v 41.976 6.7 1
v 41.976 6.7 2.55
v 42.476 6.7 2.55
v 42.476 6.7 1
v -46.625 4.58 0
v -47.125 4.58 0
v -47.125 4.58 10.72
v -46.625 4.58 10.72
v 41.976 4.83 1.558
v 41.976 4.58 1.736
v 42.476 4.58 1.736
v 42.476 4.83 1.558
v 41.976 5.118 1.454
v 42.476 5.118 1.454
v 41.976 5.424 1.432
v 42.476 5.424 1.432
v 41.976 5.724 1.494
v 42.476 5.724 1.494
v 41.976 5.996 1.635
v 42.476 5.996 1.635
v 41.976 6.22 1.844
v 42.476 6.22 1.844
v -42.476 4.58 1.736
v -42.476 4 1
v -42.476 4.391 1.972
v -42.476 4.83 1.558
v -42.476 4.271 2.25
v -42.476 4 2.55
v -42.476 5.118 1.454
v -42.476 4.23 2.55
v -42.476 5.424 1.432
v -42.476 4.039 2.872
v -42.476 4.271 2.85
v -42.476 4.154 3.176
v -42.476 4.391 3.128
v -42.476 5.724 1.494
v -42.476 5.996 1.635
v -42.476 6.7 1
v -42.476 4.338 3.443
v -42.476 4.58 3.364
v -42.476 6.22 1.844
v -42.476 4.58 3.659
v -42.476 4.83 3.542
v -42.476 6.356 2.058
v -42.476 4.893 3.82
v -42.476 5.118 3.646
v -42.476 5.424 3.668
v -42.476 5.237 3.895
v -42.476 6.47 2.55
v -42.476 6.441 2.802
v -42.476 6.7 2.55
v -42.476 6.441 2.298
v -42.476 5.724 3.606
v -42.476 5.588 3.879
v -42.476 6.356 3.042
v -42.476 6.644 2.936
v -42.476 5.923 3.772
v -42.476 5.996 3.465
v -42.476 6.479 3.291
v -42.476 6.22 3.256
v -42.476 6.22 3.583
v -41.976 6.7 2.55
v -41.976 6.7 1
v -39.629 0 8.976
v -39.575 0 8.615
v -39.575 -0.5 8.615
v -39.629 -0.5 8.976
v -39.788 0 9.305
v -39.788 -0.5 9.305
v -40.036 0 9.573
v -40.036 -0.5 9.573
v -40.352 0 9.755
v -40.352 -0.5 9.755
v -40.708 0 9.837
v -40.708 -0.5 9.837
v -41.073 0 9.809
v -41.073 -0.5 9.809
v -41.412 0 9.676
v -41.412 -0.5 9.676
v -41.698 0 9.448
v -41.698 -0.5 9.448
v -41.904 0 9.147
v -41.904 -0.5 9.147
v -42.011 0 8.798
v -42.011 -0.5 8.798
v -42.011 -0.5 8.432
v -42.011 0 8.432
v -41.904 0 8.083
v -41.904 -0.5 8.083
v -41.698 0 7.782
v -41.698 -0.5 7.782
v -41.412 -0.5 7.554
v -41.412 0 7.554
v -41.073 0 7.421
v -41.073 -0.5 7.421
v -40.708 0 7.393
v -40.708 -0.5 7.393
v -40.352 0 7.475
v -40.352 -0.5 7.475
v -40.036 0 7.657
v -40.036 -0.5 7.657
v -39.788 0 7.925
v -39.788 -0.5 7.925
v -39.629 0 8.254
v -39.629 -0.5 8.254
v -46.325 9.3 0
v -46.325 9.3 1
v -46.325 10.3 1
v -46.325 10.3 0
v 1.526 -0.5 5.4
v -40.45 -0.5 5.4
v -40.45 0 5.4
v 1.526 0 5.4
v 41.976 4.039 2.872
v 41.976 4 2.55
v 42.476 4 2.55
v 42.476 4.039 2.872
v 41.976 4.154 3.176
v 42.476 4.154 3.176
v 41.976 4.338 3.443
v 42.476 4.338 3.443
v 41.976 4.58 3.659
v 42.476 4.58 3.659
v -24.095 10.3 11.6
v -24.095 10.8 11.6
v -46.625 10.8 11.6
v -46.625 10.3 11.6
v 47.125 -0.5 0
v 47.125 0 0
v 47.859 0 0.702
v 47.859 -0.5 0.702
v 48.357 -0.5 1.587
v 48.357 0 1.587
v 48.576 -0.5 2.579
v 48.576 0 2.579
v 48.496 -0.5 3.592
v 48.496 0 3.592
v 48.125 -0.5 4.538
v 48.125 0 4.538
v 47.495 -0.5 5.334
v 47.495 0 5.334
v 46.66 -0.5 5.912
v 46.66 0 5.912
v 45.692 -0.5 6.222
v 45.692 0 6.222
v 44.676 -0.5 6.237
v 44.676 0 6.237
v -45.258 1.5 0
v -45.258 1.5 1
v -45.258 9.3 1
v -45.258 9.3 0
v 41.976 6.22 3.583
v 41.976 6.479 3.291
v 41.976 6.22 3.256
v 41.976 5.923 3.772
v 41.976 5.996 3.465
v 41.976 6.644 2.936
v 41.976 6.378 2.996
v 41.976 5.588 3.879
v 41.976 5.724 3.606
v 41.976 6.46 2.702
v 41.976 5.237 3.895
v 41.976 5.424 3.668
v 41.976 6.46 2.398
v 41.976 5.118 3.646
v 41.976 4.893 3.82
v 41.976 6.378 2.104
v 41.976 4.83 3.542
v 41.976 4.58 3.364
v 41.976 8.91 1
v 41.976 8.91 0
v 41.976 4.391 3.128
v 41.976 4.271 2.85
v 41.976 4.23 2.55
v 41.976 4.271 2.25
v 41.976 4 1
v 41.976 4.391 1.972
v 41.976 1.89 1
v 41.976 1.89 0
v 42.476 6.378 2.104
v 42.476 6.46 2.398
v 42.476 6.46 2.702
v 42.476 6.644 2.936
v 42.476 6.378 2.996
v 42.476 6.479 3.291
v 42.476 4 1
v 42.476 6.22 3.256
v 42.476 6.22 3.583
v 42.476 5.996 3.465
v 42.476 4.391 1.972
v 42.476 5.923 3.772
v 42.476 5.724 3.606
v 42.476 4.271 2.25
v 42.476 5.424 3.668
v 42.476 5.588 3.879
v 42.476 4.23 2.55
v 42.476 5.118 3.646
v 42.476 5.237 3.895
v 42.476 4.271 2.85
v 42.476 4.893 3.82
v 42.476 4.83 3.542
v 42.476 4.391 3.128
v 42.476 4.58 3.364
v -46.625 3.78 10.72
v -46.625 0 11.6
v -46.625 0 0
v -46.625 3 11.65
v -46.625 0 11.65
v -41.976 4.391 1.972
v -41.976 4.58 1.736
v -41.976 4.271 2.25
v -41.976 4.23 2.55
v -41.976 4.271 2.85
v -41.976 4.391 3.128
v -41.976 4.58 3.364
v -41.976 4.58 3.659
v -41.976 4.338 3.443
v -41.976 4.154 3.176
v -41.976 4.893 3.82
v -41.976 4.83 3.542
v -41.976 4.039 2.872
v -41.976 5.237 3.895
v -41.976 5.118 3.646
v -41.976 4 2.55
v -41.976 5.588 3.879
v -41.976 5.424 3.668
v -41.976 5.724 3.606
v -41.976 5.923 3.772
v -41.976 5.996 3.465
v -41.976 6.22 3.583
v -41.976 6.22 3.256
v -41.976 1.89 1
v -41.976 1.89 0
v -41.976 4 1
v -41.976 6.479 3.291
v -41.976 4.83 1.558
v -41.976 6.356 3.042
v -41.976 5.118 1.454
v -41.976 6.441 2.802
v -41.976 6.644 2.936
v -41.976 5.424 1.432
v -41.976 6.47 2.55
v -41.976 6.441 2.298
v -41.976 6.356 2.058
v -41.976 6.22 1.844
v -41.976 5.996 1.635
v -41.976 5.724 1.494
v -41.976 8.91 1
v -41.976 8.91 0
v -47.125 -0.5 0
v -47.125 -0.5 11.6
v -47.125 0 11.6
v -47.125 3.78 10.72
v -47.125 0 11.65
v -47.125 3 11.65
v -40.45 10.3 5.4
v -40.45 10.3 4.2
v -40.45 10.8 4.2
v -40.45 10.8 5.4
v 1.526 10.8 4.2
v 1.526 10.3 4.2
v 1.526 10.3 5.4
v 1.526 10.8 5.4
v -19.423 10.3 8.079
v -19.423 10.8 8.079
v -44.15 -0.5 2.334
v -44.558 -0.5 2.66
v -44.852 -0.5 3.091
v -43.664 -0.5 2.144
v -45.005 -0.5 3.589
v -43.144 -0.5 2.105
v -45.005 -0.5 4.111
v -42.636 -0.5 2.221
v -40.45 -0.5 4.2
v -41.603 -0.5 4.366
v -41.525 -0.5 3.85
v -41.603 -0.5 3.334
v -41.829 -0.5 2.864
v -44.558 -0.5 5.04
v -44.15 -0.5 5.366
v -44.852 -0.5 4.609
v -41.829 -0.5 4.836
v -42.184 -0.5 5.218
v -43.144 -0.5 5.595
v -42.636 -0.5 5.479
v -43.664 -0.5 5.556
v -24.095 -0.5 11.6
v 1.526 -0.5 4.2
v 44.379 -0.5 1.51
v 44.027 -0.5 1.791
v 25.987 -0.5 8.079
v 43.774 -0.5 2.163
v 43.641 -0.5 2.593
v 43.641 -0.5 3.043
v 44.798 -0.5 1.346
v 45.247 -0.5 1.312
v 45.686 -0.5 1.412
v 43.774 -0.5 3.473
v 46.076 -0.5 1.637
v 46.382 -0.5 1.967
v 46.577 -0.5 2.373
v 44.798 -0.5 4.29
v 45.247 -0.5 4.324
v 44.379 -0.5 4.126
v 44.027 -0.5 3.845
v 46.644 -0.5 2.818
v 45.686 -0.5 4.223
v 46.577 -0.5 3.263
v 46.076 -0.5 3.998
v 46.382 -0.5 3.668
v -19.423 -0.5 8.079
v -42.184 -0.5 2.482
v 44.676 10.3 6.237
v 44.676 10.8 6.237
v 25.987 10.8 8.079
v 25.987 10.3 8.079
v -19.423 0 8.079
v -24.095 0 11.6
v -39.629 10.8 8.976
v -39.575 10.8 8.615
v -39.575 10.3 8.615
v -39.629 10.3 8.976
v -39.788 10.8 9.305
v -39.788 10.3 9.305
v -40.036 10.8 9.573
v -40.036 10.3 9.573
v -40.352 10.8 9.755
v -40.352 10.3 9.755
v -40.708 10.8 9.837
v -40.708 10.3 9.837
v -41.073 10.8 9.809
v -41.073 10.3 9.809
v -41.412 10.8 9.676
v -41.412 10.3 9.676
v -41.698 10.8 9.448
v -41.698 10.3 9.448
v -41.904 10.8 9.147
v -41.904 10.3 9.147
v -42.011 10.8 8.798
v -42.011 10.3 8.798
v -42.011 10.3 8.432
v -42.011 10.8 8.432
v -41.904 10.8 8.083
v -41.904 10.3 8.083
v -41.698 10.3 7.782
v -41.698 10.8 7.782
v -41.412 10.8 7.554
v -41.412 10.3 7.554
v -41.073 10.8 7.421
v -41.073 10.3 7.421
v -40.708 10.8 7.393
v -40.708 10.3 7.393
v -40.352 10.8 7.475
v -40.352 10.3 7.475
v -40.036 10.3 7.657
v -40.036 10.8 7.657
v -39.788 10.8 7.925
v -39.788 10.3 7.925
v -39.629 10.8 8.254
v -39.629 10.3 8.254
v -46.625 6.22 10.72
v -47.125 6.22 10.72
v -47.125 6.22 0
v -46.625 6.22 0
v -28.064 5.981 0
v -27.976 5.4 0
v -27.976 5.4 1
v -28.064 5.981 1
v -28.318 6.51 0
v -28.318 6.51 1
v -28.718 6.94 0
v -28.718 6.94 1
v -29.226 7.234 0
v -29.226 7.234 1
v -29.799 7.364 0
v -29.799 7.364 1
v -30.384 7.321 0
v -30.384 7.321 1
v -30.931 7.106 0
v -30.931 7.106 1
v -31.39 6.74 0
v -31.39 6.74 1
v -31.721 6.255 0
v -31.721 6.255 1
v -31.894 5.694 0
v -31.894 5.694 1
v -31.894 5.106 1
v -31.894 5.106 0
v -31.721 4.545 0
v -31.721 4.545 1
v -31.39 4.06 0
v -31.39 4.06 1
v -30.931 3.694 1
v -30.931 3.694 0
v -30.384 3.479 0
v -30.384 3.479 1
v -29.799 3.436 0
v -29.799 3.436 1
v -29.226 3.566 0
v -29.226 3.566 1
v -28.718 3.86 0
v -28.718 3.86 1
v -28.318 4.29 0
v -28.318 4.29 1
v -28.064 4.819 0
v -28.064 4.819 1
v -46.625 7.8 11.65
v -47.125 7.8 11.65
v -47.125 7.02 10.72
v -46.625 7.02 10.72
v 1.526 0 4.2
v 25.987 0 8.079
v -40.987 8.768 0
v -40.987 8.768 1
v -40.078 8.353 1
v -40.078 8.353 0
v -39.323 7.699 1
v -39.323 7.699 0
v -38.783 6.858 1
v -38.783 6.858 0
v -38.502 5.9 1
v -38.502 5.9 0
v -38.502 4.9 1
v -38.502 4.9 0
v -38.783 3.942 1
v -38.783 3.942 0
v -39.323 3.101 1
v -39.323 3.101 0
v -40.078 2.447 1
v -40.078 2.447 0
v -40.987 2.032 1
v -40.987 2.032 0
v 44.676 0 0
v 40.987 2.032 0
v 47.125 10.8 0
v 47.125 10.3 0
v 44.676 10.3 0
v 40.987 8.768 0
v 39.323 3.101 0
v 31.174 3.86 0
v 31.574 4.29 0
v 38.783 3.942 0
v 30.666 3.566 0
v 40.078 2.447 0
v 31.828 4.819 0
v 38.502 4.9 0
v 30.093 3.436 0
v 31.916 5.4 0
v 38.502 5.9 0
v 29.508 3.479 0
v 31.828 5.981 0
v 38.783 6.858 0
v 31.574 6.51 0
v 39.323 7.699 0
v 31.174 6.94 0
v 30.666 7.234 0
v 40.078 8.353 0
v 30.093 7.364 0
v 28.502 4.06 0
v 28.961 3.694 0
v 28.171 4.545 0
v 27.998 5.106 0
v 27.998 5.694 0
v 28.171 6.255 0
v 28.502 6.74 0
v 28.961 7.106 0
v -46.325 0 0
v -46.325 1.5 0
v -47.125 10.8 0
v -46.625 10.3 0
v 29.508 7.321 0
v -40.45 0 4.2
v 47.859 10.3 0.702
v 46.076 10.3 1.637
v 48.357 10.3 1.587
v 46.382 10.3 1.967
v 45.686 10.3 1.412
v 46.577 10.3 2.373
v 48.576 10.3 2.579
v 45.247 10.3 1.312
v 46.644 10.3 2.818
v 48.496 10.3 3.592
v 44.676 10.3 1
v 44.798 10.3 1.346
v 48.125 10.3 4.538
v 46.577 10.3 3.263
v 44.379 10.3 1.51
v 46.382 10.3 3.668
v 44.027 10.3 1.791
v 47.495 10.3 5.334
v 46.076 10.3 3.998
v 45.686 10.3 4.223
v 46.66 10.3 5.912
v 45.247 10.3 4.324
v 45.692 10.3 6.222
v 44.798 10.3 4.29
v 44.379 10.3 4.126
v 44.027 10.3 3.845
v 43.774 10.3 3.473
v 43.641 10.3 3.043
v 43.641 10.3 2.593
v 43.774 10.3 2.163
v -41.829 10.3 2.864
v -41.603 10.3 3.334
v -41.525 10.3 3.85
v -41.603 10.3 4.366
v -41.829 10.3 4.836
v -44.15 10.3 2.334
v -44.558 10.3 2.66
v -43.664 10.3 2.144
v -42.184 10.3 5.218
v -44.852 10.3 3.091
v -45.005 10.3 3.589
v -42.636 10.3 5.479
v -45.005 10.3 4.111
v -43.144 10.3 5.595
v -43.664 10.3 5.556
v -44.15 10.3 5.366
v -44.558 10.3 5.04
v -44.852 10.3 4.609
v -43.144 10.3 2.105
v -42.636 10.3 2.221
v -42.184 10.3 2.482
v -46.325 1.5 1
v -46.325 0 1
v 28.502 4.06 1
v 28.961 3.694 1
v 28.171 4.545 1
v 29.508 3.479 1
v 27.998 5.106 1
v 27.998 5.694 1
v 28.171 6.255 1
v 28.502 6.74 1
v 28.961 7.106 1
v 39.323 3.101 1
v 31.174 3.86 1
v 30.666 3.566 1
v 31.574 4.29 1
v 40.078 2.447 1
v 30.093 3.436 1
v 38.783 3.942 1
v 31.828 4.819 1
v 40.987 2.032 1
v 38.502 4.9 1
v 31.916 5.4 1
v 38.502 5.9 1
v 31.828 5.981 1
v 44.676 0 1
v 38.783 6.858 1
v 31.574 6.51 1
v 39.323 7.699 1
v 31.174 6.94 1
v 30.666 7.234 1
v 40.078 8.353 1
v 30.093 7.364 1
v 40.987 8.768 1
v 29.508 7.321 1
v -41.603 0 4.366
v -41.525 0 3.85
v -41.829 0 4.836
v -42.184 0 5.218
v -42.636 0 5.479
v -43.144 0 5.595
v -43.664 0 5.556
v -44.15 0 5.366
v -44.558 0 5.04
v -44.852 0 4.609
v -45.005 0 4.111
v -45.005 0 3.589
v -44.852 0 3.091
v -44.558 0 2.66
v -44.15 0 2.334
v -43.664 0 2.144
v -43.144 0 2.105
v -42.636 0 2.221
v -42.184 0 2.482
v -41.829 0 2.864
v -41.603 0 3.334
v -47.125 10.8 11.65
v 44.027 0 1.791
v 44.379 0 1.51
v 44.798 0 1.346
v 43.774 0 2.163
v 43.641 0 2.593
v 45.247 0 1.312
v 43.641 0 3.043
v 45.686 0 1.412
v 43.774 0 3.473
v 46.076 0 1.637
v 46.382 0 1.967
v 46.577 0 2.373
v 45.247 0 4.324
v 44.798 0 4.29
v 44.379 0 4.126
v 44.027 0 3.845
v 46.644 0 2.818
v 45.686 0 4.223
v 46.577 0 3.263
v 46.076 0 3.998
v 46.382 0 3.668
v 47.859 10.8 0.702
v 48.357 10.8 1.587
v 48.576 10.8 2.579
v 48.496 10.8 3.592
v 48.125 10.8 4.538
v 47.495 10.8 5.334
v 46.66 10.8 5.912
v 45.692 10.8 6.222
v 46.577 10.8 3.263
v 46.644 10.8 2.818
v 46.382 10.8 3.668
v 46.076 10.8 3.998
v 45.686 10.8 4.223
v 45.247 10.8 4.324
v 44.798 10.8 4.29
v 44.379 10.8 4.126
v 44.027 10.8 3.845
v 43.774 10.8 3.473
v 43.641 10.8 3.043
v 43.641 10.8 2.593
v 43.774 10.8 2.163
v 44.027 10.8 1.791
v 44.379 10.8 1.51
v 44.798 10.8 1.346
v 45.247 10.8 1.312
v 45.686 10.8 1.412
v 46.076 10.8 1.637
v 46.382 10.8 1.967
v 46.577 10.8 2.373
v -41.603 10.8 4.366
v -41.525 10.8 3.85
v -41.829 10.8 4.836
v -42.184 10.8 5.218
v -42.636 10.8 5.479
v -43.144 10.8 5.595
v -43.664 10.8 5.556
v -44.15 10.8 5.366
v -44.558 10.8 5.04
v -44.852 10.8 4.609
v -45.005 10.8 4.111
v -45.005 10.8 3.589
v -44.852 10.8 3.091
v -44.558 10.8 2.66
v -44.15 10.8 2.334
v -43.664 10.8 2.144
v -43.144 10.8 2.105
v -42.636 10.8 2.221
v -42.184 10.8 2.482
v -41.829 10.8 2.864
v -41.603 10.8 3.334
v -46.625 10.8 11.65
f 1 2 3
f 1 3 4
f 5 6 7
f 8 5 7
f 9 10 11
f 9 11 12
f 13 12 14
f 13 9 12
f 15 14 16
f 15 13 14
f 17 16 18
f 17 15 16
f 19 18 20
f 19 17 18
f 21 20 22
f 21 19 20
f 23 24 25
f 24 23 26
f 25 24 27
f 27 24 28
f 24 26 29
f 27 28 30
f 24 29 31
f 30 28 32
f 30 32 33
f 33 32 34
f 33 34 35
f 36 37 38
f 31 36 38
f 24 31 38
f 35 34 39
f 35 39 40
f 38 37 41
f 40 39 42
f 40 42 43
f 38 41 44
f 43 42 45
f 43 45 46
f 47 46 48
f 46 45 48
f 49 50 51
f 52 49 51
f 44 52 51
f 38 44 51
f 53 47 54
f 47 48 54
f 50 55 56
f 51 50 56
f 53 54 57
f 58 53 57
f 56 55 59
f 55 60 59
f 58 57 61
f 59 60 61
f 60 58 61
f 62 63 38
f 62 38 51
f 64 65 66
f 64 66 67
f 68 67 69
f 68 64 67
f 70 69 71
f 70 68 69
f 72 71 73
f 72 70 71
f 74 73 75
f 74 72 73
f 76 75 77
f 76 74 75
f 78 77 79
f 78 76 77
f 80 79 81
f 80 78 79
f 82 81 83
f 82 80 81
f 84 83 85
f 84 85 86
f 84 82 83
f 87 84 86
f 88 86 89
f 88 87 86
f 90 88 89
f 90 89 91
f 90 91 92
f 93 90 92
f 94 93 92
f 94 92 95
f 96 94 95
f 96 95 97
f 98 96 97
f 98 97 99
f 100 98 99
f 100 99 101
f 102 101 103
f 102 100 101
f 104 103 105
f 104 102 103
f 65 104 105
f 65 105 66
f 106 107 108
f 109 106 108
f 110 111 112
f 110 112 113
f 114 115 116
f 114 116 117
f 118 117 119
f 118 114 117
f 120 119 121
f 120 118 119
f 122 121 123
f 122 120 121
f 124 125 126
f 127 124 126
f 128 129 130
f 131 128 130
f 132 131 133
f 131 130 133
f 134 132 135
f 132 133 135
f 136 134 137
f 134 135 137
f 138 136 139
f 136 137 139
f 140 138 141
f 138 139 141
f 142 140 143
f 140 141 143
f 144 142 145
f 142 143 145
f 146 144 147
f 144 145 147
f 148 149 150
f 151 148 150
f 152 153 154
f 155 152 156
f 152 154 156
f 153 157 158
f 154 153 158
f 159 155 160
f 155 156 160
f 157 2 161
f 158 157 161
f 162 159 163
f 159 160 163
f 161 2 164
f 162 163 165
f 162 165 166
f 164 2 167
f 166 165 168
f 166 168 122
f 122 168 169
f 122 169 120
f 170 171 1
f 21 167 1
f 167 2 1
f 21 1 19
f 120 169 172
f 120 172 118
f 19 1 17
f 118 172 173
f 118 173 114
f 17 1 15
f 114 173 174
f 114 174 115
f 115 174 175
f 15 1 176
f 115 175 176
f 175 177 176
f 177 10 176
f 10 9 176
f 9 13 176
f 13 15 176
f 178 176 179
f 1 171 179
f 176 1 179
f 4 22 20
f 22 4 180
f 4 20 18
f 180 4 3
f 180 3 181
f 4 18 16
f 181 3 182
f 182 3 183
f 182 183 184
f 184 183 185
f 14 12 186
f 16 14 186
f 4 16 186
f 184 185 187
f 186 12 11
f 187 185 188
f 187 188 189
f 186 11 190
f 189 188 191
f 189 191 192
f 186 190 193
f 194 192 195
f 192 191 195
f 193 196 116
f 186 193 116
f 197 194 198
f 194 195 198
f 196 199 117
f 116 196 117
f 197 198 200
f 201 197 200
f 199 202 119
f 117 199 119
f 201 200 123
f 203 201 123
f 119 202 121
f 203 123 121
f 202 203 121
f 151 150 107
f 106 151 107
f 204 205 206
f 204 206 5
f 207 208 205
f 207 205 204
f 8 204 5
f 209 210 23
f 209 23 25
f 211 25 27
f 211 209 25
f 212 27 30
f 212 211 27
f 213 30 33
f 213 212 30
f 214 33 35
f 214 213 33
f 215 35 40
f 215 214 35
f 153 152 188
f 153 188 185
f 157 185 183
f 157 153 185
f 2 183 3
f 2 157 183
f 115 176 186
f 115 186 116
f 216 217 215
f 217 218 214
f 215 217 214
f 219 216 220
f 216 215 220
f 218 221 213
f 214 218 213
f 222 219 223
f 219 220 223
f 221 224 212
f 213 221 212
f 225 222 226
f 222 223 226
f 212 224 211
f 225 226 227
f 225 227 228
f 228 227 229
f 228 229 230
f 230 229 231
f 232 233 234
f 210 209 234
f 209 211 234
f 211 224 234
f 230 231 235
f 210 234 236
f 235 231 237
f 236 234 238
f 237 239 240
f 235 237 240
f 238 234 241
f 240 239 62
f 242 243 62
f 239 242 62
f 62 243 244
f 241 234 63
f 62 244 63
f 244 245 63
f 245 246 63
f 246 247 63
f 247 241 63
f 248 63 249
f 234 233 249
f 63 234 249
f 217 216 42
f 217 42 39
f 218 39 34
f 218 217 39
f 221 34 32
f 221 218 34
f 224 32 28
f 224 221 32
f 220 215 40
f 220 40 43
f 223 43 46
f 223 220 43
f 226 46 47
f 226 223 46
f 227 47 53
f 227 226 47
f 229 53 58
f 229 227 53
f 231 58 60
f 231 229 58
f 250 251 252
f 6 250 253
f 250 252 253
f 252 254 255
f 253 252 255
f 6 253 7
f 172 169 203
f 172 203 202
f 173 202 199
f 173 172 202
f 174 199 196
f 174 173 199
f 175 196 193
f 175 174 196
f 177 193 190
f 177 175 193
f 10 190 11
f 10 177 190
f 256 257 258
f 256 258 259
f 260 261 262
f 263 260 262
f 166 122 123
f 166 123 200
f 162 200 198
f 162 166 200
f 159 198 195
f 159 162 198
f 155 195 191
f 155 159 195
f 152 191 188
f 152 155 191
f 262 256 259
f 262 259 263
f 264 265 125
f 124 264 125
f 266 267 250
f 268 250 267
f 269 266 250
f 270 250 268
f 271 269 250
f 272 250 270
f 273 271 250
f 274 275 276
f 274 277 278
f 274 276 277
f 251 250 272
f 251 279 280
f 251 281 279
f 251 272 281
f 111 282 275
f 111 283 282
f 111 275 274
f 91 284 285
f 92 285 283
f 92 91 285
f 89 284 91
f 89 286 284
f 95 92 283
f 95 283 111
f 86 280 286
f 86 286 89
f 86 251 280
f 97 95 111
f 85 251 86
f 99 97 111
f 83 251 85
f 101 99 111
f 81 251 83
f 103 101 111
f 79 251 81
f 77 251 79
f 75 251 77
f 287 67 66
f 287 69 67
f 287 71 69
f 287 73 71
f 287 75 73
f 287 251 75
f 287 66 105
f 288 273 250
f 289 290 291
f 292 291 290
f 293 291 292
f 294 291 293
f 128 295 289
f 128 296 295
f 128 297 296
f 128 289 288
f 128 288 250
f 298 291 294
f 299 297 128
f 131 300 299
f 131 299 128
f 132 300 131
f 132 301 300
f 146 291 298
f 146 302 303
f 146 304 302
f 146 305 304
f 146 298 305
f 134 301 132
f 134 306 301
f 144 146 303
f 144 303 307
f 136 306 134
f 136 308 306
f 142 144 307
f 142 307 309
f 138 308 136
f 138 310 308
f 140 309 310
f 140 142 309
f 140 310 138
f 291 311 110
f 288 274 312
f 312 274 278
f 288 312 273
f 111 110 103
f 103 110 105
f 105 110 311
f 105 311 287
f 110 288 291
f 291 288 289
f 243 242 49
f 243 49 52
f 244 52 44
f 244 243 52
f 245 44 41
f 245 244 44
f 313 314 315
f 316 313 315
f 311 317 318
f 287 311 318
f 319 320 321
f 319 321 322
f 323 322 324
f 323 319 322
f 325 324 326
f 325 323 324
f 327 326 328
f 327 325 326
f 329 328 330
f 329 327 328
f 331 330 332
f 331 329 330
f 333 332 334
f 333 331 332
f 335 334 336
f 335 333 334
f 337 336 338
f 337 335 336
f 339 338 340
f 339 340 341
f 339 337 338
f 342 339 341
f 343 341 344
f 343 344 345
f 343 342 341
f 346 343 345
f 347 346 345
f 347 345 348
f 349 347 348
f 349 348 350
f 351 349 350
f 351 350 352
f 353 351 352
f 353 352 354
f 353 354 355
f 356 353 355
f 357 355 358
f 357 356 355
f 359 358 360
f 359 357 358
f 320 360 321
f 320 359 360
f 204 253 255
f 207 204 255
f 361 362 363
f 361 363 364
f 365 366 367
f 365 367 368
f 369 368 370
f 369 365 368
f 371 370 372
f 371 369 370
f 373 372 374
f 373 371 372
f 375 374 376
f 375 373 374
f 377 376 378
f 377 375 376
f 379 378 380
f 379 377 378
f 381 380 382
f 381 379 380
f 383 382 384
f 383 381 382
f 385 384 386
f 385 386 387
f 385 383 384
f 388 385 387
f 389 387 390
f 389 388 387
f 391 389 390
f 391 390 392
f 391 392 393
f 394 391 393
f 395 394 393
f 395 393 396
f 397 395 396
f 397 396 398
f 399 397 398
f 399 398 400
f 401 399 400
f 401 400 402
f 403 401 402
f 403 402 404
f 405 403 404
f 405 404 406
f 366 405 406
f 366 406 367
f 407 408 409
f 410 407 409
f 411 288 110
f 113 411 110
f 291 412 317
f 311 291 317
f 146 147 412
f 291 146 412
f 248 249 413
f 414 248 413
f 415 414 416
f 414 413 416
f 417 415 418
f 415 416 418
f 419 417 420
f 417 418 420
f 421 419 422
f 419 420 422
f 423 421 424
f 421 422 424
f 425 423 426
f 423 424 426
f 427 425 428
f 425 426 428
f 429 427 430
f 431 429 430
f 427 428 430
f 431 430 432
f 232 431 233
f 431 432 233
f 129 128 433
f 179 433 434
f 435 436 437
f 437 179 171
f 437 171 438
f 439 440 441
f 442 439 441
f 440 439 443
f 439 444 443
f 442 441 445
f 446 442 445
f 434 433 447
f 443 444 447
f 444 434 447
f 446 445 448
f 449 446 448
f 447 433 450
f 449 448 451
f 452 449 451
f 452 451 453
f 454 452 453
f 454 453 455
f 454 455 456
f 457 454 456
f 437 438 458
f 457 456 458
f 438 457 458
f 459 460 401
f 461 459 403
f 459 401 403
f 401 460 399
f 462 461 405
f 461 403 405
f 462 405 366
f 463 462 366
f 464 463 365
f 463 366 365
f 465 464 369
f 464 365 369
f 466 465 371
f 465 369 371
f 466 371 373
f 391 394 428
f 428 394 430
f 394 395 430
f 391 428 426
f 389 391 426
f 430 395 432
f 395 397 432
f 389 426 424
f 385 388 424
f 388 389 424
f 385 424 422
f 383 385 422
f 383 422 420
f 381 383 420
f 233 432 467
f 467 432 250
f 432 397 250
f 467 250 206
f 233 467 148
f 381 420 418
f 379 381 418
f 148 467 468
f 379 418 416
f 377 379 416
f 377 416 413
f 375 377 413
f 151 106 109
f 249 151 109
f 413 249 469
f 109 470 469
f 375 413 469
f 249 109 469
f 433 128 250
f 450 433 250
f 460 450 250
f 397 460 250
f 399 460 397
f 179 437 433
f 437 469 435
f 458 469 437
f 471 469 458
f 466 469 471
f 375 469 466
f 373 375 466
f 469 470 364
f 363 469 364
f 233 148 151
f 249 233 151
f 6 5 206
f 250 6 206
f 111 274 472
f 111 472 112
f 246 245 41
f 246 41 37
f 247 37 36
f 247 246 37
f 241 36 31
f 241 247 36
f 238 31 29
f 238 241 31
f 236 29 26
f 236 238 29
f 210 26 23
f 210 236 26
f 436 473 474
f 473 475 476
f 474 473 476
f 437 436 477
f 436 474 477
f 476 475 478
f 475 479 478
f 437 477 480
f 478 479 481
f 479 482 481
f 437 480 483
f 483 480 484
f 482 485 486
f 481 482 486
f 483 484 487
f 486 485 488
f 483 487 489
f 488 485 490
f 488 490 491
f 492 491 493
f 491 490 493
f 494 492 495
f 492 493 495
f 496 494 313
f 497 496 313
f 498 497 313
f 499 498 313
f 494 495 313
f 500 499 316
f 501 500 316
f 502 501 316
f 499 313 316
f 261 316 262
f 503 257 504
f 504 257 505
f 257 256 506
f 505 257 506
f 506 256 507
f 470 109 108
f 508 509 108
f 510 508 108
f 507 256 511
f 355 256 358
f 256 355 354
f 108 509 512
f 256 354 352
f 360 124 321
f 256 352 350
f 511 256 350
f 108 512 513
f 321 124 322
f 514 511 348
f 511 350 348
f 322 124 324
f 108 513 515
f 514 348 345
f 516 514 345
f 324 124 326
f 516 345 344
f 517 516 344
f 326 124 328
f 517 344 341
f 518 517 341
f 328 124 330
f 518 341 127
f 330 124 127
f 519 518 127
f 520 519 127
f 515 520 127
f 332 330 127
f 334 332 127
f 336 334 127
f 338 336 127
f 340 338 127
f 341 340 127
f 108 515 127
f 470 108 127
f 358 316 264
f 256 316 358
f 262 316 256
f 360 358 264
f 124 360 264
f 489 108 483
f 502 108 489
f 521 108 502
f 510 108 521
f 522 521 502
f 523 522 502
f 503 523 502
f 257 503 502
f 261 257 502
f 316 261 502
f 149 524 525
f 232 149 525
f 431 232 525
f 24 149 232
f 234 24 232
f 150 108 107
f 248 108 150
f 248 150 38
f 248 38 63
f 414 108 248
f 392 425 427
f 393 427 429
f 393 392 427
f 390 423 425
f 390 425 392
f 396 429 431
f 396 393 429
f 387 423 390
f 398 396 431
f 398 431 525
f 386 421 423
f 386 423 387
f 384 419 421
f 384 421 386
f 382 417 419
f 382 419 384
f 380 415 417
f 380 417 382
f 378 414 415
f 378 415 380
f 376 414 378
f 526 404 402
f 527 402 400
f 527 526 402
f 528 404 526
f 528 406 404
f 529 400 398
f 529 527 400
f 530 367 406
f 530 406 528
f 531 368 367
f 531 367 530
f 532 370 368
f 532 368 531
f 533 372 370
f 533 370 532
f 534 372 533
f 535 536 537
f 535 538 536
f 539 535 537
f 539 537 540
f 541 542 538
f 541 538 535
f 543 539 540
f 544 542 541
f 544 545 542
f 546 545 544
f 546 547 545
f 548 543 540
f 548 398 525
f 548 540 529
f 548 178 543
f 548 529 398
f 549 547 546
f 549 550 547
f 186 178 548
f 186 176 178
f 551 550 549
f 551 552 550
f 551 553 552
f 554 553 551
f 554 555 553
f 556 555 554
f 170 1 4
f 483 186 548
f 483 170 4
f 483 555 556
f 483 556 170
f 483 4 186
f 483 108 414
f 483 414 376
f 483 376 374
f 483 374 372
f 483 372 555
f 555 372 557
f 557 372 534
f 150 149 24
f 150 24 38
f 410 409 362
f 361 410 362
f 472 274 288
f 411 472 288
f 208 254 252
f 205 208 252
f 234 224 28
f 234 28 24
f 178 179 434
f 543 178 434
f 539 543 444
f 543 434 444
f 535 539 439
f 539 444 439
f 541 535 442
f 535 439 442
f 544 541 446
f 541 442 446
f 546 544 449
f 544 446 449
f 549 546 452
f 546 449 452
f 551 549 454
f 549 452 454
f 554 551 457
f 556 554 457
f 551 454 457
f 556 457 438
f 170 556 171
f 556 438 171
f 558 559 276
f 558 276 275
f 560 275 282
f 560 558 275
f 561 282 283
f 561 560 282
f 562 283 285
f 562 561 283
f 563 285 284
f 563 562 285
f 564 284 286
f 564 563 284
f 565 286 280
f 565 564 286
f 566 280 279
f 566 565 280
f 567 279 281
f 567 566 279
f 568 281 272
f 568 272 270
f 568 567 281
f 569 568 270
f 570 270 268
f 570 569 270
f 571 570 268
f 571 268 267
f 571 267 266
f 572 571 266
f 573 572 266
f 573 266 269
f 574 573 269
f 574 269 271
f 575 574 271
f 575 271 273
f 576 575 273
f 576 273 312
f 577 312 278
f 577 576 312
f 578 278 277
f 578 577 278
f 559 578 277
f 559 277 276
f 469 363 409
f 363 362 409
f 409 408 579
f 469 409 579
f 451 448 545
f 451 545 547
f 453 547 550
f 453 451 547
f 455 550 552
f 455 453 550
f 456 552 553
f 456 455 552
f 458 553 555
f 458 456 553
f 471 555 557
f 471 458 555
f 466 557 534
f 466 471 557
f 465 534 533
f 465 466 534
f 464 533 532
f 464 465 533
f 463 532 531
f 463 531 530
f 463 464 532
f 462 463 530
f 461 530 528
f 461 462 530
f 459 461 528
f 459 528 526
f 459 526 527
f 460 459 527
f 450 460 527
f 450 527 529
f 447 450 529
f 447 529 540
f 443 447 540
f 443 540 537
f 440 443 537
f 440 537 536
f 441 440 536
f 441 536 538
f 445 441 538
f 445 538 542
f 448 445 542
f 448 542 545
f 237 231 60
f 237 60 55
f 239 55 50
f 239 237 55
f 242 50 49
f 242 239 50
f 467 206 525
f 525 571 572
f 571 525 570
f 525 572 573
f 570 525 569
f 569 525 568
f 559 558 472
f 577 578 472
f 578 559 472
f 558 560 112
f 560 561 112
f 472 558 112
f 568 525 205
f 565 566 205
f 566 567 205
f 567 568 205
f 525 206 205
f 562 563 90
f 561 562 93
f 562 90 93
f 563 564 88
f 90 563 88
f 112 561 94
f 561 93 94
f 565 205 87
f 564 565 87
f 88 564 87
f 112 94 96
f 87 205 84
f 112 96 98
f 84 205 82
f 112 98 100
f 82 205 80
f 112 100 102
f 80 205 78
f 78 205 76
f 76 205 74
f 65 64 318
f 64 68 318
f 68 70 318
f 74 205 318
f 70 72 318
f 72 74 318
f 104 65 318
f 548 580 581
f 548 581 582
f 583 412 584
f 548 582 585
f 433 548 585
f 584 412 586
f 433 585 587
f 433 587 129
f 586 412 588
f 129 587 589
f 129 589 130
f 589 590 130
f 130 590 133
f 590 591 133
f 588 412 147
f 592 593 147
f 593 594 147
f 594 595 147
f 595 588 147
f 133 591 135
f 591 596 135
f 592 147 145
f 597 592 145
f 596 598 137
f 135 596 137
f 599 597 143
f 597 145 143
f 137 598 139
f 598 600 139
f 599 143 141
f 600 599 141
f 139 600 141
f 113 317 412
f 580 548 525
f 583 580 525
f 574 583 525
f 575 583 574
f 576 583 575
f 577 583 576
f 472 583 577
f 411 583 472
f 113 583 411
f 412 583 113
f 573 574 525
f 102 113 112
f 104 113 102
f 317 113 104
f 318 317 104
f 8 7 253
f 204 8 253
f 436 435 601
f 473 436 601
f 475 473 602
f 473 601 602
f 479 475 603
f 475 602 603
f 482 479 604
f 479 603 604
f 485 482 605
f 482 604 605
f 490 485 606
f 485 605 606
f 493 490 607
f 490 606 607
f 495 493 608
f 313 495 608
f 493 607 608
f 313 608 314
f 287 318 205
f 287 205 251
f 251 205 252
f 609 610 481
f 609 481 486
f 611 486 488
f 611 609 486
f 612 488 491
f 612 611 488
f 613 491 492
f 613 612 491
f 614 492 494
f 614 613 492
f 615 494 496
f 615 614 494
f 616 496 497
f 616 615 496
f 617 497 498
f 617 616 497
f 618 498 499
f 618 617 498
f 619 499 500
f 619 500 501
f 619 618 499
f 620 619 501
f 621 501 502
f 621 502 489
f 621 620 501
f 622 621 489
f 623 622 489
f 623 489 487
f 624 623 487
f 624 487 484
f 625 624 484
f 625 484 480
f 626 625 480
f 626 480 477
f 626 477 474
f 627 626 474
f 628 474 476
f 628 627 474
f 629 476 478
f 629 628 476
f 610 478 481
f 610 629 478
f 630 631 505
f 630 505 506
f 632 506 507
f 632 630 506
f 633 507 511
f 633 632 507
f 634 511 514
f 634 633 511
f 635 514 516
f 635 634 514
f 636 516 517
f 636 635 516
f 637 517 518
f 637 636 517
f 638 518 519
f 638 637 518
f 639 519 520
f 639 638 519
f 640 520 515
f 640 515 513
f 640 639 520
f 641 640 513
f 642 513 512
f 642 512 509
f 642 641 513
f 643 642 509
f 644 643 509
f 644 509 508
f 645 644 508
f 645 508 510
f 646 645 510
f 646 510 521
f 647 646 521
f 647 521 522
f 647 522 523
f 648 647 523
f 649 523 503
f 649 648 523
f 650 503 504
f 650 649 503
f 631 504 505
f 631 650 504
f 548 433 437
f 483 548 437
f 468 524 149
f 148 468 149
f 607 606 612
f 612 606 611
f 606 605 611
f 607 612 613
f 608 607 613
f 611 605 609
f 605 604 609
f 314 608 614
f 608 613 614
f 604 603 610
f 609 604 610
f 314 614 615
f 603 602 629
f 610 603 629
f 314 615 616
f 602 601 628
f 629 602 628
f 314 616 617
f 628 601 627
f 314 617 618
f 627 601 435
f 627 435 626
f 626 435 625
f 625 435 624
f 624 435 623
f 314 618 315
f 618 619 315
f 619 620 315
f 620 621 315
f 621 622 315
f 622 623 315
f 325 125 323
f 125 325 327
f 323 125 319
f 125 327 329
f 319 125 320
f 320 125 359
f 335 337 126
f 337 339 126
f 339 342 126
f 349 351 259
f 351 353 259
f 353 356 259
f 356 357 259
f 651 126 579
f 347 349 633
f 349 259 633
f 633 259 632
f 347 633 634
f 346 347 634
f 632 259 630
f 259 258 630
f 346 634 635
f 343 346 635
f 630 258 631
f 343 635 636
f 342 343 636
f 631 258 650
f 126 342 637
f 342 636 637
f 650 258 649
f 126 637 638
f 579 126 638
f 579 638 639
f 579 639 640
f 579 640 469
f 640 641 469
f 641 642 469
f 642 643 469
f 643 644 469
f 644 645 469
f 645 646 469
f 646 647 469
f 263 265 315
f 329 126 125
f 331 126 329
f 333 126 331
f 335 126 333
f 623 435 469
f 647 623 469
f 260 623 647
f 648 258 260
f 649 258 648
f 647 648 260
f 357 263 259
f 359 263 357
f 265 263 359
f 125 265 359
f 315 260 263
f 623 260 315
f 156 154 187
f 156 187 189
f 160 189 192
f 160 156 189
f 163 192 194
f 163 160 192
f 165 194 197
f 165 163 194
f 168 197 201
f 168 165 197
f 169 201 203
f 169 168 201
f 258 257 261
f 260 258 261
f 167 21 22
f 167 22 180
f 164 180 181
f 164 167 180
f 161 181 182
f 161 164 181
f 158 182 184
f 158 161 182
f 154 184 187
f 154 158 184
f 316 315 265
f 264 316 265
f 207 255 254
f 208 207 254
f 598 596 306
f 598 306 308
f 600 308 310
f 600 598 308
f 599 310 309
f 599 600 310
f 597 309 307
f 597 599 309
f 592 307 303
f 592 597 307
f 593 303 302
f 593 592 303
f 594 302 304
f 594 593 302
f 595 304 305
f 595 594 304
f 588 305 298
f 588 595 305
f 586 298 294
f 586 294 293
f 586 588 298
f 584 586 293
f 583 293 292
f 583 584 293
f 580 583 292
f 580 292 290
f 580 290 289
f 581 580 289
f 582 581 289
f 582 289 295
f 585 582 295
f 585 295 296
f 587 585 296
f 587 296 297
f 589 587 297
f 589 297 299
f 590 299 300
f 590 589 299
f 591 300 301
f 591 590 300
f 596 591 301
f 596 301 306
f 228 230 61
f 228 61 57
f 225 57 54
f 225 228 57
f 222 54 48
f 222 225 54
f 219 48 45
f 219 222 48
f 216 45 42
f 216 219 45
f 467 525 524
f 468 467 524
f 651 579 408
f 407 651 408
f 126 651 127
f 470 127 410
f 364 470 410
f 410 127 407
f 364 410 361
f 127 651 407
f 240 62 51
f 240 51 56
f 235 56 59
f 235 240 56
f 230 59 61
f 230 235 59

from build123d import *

# Parameters (mm, degrees)
F0_R      = 1.75
F0_R_2    = 1.51
F0_R_3    = 1.225
F8_DEPTH  = 0.5
F2_R      = 1.75
F2_R_2    = 1.51
F2_R_3    = 1.225
F9_DEPTH  = 0.5
F7_R      = 1.97
F10_DEPTH = 0.5
F11_DEPTH = 1
F12_DEPTH = 0.5
F13_DEPTH = 25
F16_DEPTH = 0.5
F17_DEPTH = 0.5
F18_W     = 41.976
F18_H     = 1.2
F19_DEPTH = 11.301


# Not quite as in the source:
# - a feature names something its author has since deleted; it is built from what else it names


with BuildPart() as f8:
    # F0 (on Front) → F8 (new body)
    with BuildSketch(Plane.XZ):
        with BuildLine():
            Line((-24.095, 11.6), (-47.125, 11.6))
            Line((-47.125, 11.6), (-47.125, 0))
            Line((-47.125, 0), (47.125, 0))
            ThreePointArc((47.125, 0), (48.3457892371, 4.0785044966), (44.6764603032, 6.2373353065))
            Line((44.6764603032, 6.2373353065), (25.9870177338, 8.0793821146))
            Line((25.9870177338, 8.0793821146), (-19.4229822662, 8.0793821146))
            Line((-19.4229822662, 8.0793821146), (-24.095, 11.6))
        make_face()
        with Locations((-43.275, 3.85)):
            Circle(F0_R, mode=Mode.SUBTRACT)
        with Locations((45.1343327214, 2.8178092836)):
            Circle(F0_R_2, mode=Mode.SUBTRACT)
        with Locations((-40.8, 8.615)):
            Circle(F0_R_3, mode=Mode.SUBTRACT)
    extrude(amount=F8_DEPTH)

    # F6 (on offset) → F9, piece 2 (join)
    with BuildSketch(Plane.YZ.offset(-47.125)):
        Polygon((3.7804580054, 10.7198863682), (3, 11.65), (0, 11.65), (0, 0), (4.5804580054, 0), (4.5804580054, 10.7198863682), align=None)
    extrude(amount=F9_DEPTH)



with BuildPart() as f8b:
    # F2 (on offset) → F8, piece 2 (new body)
    with BuildSketch(Plane.XZ.offset(-10.8)):
        with BuildLine():
            Line((-19.4229822662, 8.0793821146), (-24.095, 11.6))
            Line((-24.095, 11.6), (-47.125, 11.6))
            Line((-47.125, 11.6), (-47.125, 0))
            Line((-47.125, 0), (47.125, 0))
            ThreePointArc((47.125, 0), (48.3457892371, 4.0785044966), (44.6764603032, 6.2373353065))
            Line((44.6764603032, 6.2373353065), (25.9870177338, 8.0793821146))
            Line((25.9870177338, 8.0793821146), (-19.4229822662, 8.0793821146))
        make_face()
        with Locations((-43.275, 3.85)):
            Circle(F2_R, mode=Mode.SUBTRACT)
        with Locations((45.1343327214, 2.8178092836)):
            Circle(F2_R_2, mode=Mode.SUBTRACT)
        with Locations((-40.8, 8.615)):
            Circle(F2_R_3, mode=Mode.SUBTRACT)
    extrude(amount=F8_DEPTH)

    # F6 (on offset) → F9 (join)
    with BuildSketch(Plane.YZ.offset(-47.125)):
        Polygon((10.8, 0), (10.8, 11.65), (7.8, 11.65), (7.0195419946, 10.7198863682), (6.2195419946, 10.7198863682), (6.2195419946, 0), align=None)
    extrude(amount=F9_DEPTH)


with BuildPart() as f8_1:
    add(f8.part)

    add(f8b.part)  # F10 merges F8b
    # F7 (on Top) → F10 (join)
    with BuildSketch(Plane.XY):
        Polygon((-47.125, 4.45), (-47.125, 0), (-46.325, 0), (-46.325, 1.5), (-45.2581904829, 1.5), (-45.2581904829, 9.3), (-46.325, 9.3), (-46.325, 10.8), (-47.125, 10.8), (-47.125, 5.95), align=None)
        Polygon((-46.325, 1.5), (-46.325, 0), (-24.095, 0), (-19.4229822662, 0), (25.9870177338, 0), (44.676, 0), (44.676, 10.8), (25.9870177338, 10.8), (-19.4229822662, 10.8), (-46.325, 10.8), (-46.325, 9.3), (-45.2581904829, 9.3), (-45.2581904829, 1.5), align=None)
        with BuildLine():
            Line((-41.976, 1.89), (-41.976, 8.91))
            ThreePointArc((-41.976, 8.91), (-38.466, 5.4), (-41.976, 1.89))
        make_face(mode=Mode.SUBTRACT)
        with Locations((-29.946, 5.4)):
            Circle(F7_R, mode=Mode.SUBTRACT)
        with Locations((29.946, 5.4)):
            Circle(F7_R, mode=Mode.SUBTRACT)
        with BuildLine():
            Line((41.976, 8.91), (41.976, 1.89))
            ThreePointArc((41.976, 1.89), (38.466, 5.4), (41.976, 8.91))
        make_face(mode=Mode.SUBTRACT)
    extrude(amount=F10_DEPTH)

    # F7 (on Top) → F11 (join)
    with BuildSketch(Plane.XY):
        Polygon((-46.325, 1.5), (-46.325, 0), (-24.095, 0), (-19.4229822662, 0), (25.9870177338, 0), (44.676, 0), (44.676, 10.8), (25.9870177338, 10.8), (-19.4229822662, 10.8), (-46.325, 10.8), (-46.325, 9.3), (-45.2581904829, 9.3), (-45.2581904829, 1.5), align=None)
        with BuildLine():
            Line((-41.976, 1.89), (-41.976, 8.91))
            ThreePointArc((-41.976, 8.91), (-38.466, 5.4), (-41.976, 1.89))
        make_face(mode=Mode.SUBTRACT)
        with Locations((-29.946, 5.4)):
            Circle(F7_R, mode=Mode.SUBTRACT)
        with Locations((29.946, 5.4)):
            Circle(F7_R, mode=Mode.SUBTRACT)
        with BuildLine():
            Line((41.976, 8.91), (41.976, 1.89))
            ThreePointArc((41.976, 1.89), (38.466, 5.4), (41.976, 8.91))
        make_face(mode=Mode.SUBTRACT)
    extrude(amount=F11_DEPTH)

    # F6 (on offset) → F12 (join)
    with BuildSketch(Plane.YZ.offset(-47.125)):
        Polygon((3.7804580054, 10.7198863682), (3, 11.65), (0, 11.65), (0, 0), (4.5804580054, 0), (4.5804580054, 10.7198863682), align=None)
    extrude(amount=F12_DEPTH)

    # F13 (cut): a face of the model
    f13_faces = [f8_1.faces().sort_by_distance(p)[0] for p in [
        (-46.0368491628, 5.3368390391, 0.5),
    ]]
    extrude(f13_faces, amount=-F13_DEPTH, mode=Mode.SUBTRACT)

    # F14 (on face) → F16 (join)
    with BuildSketch(Plane.YZ.offset(-41.976)):
        with BuildLine():
            Line((4, 2.55), (4, 1))
            Line((4, 1), (4.5804580054, 1))
            Line((4.5804580054, 1), (4.5804580054, 1.7362401346))
            ThreePointArc((4.5804580054, 1.7362401346), (4.23, 2.55), (4.5804580054, 3.3637598654))
            Line((4.5804580054, 3.3637598654), (4.5804580054, 3.6591912001))
            ThreePointArc((4.5804580054, 3.6591912001), (4.1538851032, 3.175946606), (4, 2.55))
        make_face()
        with BuildLine():
            ThreePointArc((6.2195419946, 3.5826648631), (5.4129608614, 3.8985310267), (4.5804580054, 3.6591912001))
            Line((4.5804580054, 3.6591912001), (4.5804580054, 3.3637598654))
            ThreePointArc((4.5804580054, 3.3637598654), (5.4235415848, 3.6675829434), (6.2195419946, 3.2559013526))
            Line((6.2195419946, 3.2559013526), (6.2195419946, 3.5826648631))
        make_face()
        with BuildLine():
            Line((4.5804580054, 1.7362401346), (4.5804580054, 1))
            Line((4.5804580054, 1), (6.2195419946, 1))
            Line((6.2195419946, 1), (6.2195419946, 1.8440986474))
            ThreePointArc((6.2195419946, 1.8440986474), (5.4235415848, 1.4324170566), (4.5804580054, 1.7362401346))
        make_face()
        with BuildLine():
            Line((6.2195419946, 1.8440986474), (6.2195419946, 1))
            Line((6.2195419946, 1), (6.7, 1))
            Line((6.7, 1), (6.7, 2.55))
            ThreePointArc((6.7, 2.55), (6.5740060647, 3.1194814779), (6.2195419946, 3.5826648631))
            Line((6.2195419946, 3.5826648631), (6.2195419946, 3.2559013526))
            ThreePointArc((6.2195419946, 3.2559013526), (6.4055299697, 2.9245083217), (6.47, 2.55))
            ThreePointArc((6.47, 2.55), (6.4055299697, 2.1754916783), (6.2195419946, 1.8440986474))
        make_face()
    extrude(amount=-F16_DEPTH)

    # F15 (on face) → F17 (join)
    with BuildSketch(Plane(origin=(41.976, 0, 0), x_dir=(0, -1, 0), z_dir=(-1, 0, 0))):
        with BuildLine():
            ThreePointArc((-4.5804580054, 3.3637598654), (-4.23, 2.55), (-4.5804580054, 1.7362401346))
            Line((-4.5804580054, 1.7362401346), (-4.5804580054, 1))
            Line((-4.5804580054, 1), (-4, 1))
            Line((-4, 1), (-4, 2.55))
            ThreePointArc((-4, 2.55), (-4.1538851032, 3.175946606), (-4.5804580054, 3.6591912001))
            Line((-4.5804580054, 3.6591912001), (-4.5804580054, 3.3637598654))
        make_face()
        with BuildLine():
            Line((-6.2195419946, 3.5826648631), (-6.2195419946, 3.2559013526))
            ThreePointArc((-6.2195419946, 3.2559013526), (-5.4235415848, 3.6675829434), (-4.5804580054, 3.3637598654))
            Line((-4.5804580054, 3.3637598654), (-4.5804580054, 3.6591912001))
            ThreePointArc((-4.5804580054, 3.6591912001), (-5.4129608614, 3.8985310267), (-6.2195419946, 3.5826648631))
        make_face()
        with BuildLine():
            Line((-6.2195419946, 1), (-6.2195419946, 1.8440986474))
            ThreePointArc((-6.2195419946, 1.8440986474), (-6.47, 2.55), (-6.2195419946, 3.2559013526))
            Line((-6.2195419946, 3.2559013526), (-6.2195419946, 3.5826648631))
            ThreePointArc((-6.2195419946, 3.5826648631), (-6.5740060647, 3.1194814779), (-6.7, 2.55))
            Line((-6.7, 2.55), (-6.7, 1))
            Line((-6.7, 1), (-6.2195419946, 1))
        make_face()
        with BuildLine():
            ThreePointArc((-4.5804580054, 1.7362401346), (-5.4235415848, 1.4324170566), (-6.2195419946, 1.8440986474))
            Line((-6.2195419946, 1.8440986474), (-6.2195419946, 1))
            Line((-6.2195419946, 1), (-4.5804580054, 1))
            Line((-4.5804580054, 1), (-4.5804580054, 1.7362401346))
        make_face()
    extrude(amount=-F17_DEPTH)

    # F18 (on face) → F19 (cut, through all)
    with BuildSketch(Plane.XZ.offset(0.5)):
        with Locations((-19.4615396968, 4.8)):
            Rectangle(F18_W, F18_H)
    extrude(amount=-F19_DEPTH, mode=Mode.SUBTRACT)


solid = f8_1.part
